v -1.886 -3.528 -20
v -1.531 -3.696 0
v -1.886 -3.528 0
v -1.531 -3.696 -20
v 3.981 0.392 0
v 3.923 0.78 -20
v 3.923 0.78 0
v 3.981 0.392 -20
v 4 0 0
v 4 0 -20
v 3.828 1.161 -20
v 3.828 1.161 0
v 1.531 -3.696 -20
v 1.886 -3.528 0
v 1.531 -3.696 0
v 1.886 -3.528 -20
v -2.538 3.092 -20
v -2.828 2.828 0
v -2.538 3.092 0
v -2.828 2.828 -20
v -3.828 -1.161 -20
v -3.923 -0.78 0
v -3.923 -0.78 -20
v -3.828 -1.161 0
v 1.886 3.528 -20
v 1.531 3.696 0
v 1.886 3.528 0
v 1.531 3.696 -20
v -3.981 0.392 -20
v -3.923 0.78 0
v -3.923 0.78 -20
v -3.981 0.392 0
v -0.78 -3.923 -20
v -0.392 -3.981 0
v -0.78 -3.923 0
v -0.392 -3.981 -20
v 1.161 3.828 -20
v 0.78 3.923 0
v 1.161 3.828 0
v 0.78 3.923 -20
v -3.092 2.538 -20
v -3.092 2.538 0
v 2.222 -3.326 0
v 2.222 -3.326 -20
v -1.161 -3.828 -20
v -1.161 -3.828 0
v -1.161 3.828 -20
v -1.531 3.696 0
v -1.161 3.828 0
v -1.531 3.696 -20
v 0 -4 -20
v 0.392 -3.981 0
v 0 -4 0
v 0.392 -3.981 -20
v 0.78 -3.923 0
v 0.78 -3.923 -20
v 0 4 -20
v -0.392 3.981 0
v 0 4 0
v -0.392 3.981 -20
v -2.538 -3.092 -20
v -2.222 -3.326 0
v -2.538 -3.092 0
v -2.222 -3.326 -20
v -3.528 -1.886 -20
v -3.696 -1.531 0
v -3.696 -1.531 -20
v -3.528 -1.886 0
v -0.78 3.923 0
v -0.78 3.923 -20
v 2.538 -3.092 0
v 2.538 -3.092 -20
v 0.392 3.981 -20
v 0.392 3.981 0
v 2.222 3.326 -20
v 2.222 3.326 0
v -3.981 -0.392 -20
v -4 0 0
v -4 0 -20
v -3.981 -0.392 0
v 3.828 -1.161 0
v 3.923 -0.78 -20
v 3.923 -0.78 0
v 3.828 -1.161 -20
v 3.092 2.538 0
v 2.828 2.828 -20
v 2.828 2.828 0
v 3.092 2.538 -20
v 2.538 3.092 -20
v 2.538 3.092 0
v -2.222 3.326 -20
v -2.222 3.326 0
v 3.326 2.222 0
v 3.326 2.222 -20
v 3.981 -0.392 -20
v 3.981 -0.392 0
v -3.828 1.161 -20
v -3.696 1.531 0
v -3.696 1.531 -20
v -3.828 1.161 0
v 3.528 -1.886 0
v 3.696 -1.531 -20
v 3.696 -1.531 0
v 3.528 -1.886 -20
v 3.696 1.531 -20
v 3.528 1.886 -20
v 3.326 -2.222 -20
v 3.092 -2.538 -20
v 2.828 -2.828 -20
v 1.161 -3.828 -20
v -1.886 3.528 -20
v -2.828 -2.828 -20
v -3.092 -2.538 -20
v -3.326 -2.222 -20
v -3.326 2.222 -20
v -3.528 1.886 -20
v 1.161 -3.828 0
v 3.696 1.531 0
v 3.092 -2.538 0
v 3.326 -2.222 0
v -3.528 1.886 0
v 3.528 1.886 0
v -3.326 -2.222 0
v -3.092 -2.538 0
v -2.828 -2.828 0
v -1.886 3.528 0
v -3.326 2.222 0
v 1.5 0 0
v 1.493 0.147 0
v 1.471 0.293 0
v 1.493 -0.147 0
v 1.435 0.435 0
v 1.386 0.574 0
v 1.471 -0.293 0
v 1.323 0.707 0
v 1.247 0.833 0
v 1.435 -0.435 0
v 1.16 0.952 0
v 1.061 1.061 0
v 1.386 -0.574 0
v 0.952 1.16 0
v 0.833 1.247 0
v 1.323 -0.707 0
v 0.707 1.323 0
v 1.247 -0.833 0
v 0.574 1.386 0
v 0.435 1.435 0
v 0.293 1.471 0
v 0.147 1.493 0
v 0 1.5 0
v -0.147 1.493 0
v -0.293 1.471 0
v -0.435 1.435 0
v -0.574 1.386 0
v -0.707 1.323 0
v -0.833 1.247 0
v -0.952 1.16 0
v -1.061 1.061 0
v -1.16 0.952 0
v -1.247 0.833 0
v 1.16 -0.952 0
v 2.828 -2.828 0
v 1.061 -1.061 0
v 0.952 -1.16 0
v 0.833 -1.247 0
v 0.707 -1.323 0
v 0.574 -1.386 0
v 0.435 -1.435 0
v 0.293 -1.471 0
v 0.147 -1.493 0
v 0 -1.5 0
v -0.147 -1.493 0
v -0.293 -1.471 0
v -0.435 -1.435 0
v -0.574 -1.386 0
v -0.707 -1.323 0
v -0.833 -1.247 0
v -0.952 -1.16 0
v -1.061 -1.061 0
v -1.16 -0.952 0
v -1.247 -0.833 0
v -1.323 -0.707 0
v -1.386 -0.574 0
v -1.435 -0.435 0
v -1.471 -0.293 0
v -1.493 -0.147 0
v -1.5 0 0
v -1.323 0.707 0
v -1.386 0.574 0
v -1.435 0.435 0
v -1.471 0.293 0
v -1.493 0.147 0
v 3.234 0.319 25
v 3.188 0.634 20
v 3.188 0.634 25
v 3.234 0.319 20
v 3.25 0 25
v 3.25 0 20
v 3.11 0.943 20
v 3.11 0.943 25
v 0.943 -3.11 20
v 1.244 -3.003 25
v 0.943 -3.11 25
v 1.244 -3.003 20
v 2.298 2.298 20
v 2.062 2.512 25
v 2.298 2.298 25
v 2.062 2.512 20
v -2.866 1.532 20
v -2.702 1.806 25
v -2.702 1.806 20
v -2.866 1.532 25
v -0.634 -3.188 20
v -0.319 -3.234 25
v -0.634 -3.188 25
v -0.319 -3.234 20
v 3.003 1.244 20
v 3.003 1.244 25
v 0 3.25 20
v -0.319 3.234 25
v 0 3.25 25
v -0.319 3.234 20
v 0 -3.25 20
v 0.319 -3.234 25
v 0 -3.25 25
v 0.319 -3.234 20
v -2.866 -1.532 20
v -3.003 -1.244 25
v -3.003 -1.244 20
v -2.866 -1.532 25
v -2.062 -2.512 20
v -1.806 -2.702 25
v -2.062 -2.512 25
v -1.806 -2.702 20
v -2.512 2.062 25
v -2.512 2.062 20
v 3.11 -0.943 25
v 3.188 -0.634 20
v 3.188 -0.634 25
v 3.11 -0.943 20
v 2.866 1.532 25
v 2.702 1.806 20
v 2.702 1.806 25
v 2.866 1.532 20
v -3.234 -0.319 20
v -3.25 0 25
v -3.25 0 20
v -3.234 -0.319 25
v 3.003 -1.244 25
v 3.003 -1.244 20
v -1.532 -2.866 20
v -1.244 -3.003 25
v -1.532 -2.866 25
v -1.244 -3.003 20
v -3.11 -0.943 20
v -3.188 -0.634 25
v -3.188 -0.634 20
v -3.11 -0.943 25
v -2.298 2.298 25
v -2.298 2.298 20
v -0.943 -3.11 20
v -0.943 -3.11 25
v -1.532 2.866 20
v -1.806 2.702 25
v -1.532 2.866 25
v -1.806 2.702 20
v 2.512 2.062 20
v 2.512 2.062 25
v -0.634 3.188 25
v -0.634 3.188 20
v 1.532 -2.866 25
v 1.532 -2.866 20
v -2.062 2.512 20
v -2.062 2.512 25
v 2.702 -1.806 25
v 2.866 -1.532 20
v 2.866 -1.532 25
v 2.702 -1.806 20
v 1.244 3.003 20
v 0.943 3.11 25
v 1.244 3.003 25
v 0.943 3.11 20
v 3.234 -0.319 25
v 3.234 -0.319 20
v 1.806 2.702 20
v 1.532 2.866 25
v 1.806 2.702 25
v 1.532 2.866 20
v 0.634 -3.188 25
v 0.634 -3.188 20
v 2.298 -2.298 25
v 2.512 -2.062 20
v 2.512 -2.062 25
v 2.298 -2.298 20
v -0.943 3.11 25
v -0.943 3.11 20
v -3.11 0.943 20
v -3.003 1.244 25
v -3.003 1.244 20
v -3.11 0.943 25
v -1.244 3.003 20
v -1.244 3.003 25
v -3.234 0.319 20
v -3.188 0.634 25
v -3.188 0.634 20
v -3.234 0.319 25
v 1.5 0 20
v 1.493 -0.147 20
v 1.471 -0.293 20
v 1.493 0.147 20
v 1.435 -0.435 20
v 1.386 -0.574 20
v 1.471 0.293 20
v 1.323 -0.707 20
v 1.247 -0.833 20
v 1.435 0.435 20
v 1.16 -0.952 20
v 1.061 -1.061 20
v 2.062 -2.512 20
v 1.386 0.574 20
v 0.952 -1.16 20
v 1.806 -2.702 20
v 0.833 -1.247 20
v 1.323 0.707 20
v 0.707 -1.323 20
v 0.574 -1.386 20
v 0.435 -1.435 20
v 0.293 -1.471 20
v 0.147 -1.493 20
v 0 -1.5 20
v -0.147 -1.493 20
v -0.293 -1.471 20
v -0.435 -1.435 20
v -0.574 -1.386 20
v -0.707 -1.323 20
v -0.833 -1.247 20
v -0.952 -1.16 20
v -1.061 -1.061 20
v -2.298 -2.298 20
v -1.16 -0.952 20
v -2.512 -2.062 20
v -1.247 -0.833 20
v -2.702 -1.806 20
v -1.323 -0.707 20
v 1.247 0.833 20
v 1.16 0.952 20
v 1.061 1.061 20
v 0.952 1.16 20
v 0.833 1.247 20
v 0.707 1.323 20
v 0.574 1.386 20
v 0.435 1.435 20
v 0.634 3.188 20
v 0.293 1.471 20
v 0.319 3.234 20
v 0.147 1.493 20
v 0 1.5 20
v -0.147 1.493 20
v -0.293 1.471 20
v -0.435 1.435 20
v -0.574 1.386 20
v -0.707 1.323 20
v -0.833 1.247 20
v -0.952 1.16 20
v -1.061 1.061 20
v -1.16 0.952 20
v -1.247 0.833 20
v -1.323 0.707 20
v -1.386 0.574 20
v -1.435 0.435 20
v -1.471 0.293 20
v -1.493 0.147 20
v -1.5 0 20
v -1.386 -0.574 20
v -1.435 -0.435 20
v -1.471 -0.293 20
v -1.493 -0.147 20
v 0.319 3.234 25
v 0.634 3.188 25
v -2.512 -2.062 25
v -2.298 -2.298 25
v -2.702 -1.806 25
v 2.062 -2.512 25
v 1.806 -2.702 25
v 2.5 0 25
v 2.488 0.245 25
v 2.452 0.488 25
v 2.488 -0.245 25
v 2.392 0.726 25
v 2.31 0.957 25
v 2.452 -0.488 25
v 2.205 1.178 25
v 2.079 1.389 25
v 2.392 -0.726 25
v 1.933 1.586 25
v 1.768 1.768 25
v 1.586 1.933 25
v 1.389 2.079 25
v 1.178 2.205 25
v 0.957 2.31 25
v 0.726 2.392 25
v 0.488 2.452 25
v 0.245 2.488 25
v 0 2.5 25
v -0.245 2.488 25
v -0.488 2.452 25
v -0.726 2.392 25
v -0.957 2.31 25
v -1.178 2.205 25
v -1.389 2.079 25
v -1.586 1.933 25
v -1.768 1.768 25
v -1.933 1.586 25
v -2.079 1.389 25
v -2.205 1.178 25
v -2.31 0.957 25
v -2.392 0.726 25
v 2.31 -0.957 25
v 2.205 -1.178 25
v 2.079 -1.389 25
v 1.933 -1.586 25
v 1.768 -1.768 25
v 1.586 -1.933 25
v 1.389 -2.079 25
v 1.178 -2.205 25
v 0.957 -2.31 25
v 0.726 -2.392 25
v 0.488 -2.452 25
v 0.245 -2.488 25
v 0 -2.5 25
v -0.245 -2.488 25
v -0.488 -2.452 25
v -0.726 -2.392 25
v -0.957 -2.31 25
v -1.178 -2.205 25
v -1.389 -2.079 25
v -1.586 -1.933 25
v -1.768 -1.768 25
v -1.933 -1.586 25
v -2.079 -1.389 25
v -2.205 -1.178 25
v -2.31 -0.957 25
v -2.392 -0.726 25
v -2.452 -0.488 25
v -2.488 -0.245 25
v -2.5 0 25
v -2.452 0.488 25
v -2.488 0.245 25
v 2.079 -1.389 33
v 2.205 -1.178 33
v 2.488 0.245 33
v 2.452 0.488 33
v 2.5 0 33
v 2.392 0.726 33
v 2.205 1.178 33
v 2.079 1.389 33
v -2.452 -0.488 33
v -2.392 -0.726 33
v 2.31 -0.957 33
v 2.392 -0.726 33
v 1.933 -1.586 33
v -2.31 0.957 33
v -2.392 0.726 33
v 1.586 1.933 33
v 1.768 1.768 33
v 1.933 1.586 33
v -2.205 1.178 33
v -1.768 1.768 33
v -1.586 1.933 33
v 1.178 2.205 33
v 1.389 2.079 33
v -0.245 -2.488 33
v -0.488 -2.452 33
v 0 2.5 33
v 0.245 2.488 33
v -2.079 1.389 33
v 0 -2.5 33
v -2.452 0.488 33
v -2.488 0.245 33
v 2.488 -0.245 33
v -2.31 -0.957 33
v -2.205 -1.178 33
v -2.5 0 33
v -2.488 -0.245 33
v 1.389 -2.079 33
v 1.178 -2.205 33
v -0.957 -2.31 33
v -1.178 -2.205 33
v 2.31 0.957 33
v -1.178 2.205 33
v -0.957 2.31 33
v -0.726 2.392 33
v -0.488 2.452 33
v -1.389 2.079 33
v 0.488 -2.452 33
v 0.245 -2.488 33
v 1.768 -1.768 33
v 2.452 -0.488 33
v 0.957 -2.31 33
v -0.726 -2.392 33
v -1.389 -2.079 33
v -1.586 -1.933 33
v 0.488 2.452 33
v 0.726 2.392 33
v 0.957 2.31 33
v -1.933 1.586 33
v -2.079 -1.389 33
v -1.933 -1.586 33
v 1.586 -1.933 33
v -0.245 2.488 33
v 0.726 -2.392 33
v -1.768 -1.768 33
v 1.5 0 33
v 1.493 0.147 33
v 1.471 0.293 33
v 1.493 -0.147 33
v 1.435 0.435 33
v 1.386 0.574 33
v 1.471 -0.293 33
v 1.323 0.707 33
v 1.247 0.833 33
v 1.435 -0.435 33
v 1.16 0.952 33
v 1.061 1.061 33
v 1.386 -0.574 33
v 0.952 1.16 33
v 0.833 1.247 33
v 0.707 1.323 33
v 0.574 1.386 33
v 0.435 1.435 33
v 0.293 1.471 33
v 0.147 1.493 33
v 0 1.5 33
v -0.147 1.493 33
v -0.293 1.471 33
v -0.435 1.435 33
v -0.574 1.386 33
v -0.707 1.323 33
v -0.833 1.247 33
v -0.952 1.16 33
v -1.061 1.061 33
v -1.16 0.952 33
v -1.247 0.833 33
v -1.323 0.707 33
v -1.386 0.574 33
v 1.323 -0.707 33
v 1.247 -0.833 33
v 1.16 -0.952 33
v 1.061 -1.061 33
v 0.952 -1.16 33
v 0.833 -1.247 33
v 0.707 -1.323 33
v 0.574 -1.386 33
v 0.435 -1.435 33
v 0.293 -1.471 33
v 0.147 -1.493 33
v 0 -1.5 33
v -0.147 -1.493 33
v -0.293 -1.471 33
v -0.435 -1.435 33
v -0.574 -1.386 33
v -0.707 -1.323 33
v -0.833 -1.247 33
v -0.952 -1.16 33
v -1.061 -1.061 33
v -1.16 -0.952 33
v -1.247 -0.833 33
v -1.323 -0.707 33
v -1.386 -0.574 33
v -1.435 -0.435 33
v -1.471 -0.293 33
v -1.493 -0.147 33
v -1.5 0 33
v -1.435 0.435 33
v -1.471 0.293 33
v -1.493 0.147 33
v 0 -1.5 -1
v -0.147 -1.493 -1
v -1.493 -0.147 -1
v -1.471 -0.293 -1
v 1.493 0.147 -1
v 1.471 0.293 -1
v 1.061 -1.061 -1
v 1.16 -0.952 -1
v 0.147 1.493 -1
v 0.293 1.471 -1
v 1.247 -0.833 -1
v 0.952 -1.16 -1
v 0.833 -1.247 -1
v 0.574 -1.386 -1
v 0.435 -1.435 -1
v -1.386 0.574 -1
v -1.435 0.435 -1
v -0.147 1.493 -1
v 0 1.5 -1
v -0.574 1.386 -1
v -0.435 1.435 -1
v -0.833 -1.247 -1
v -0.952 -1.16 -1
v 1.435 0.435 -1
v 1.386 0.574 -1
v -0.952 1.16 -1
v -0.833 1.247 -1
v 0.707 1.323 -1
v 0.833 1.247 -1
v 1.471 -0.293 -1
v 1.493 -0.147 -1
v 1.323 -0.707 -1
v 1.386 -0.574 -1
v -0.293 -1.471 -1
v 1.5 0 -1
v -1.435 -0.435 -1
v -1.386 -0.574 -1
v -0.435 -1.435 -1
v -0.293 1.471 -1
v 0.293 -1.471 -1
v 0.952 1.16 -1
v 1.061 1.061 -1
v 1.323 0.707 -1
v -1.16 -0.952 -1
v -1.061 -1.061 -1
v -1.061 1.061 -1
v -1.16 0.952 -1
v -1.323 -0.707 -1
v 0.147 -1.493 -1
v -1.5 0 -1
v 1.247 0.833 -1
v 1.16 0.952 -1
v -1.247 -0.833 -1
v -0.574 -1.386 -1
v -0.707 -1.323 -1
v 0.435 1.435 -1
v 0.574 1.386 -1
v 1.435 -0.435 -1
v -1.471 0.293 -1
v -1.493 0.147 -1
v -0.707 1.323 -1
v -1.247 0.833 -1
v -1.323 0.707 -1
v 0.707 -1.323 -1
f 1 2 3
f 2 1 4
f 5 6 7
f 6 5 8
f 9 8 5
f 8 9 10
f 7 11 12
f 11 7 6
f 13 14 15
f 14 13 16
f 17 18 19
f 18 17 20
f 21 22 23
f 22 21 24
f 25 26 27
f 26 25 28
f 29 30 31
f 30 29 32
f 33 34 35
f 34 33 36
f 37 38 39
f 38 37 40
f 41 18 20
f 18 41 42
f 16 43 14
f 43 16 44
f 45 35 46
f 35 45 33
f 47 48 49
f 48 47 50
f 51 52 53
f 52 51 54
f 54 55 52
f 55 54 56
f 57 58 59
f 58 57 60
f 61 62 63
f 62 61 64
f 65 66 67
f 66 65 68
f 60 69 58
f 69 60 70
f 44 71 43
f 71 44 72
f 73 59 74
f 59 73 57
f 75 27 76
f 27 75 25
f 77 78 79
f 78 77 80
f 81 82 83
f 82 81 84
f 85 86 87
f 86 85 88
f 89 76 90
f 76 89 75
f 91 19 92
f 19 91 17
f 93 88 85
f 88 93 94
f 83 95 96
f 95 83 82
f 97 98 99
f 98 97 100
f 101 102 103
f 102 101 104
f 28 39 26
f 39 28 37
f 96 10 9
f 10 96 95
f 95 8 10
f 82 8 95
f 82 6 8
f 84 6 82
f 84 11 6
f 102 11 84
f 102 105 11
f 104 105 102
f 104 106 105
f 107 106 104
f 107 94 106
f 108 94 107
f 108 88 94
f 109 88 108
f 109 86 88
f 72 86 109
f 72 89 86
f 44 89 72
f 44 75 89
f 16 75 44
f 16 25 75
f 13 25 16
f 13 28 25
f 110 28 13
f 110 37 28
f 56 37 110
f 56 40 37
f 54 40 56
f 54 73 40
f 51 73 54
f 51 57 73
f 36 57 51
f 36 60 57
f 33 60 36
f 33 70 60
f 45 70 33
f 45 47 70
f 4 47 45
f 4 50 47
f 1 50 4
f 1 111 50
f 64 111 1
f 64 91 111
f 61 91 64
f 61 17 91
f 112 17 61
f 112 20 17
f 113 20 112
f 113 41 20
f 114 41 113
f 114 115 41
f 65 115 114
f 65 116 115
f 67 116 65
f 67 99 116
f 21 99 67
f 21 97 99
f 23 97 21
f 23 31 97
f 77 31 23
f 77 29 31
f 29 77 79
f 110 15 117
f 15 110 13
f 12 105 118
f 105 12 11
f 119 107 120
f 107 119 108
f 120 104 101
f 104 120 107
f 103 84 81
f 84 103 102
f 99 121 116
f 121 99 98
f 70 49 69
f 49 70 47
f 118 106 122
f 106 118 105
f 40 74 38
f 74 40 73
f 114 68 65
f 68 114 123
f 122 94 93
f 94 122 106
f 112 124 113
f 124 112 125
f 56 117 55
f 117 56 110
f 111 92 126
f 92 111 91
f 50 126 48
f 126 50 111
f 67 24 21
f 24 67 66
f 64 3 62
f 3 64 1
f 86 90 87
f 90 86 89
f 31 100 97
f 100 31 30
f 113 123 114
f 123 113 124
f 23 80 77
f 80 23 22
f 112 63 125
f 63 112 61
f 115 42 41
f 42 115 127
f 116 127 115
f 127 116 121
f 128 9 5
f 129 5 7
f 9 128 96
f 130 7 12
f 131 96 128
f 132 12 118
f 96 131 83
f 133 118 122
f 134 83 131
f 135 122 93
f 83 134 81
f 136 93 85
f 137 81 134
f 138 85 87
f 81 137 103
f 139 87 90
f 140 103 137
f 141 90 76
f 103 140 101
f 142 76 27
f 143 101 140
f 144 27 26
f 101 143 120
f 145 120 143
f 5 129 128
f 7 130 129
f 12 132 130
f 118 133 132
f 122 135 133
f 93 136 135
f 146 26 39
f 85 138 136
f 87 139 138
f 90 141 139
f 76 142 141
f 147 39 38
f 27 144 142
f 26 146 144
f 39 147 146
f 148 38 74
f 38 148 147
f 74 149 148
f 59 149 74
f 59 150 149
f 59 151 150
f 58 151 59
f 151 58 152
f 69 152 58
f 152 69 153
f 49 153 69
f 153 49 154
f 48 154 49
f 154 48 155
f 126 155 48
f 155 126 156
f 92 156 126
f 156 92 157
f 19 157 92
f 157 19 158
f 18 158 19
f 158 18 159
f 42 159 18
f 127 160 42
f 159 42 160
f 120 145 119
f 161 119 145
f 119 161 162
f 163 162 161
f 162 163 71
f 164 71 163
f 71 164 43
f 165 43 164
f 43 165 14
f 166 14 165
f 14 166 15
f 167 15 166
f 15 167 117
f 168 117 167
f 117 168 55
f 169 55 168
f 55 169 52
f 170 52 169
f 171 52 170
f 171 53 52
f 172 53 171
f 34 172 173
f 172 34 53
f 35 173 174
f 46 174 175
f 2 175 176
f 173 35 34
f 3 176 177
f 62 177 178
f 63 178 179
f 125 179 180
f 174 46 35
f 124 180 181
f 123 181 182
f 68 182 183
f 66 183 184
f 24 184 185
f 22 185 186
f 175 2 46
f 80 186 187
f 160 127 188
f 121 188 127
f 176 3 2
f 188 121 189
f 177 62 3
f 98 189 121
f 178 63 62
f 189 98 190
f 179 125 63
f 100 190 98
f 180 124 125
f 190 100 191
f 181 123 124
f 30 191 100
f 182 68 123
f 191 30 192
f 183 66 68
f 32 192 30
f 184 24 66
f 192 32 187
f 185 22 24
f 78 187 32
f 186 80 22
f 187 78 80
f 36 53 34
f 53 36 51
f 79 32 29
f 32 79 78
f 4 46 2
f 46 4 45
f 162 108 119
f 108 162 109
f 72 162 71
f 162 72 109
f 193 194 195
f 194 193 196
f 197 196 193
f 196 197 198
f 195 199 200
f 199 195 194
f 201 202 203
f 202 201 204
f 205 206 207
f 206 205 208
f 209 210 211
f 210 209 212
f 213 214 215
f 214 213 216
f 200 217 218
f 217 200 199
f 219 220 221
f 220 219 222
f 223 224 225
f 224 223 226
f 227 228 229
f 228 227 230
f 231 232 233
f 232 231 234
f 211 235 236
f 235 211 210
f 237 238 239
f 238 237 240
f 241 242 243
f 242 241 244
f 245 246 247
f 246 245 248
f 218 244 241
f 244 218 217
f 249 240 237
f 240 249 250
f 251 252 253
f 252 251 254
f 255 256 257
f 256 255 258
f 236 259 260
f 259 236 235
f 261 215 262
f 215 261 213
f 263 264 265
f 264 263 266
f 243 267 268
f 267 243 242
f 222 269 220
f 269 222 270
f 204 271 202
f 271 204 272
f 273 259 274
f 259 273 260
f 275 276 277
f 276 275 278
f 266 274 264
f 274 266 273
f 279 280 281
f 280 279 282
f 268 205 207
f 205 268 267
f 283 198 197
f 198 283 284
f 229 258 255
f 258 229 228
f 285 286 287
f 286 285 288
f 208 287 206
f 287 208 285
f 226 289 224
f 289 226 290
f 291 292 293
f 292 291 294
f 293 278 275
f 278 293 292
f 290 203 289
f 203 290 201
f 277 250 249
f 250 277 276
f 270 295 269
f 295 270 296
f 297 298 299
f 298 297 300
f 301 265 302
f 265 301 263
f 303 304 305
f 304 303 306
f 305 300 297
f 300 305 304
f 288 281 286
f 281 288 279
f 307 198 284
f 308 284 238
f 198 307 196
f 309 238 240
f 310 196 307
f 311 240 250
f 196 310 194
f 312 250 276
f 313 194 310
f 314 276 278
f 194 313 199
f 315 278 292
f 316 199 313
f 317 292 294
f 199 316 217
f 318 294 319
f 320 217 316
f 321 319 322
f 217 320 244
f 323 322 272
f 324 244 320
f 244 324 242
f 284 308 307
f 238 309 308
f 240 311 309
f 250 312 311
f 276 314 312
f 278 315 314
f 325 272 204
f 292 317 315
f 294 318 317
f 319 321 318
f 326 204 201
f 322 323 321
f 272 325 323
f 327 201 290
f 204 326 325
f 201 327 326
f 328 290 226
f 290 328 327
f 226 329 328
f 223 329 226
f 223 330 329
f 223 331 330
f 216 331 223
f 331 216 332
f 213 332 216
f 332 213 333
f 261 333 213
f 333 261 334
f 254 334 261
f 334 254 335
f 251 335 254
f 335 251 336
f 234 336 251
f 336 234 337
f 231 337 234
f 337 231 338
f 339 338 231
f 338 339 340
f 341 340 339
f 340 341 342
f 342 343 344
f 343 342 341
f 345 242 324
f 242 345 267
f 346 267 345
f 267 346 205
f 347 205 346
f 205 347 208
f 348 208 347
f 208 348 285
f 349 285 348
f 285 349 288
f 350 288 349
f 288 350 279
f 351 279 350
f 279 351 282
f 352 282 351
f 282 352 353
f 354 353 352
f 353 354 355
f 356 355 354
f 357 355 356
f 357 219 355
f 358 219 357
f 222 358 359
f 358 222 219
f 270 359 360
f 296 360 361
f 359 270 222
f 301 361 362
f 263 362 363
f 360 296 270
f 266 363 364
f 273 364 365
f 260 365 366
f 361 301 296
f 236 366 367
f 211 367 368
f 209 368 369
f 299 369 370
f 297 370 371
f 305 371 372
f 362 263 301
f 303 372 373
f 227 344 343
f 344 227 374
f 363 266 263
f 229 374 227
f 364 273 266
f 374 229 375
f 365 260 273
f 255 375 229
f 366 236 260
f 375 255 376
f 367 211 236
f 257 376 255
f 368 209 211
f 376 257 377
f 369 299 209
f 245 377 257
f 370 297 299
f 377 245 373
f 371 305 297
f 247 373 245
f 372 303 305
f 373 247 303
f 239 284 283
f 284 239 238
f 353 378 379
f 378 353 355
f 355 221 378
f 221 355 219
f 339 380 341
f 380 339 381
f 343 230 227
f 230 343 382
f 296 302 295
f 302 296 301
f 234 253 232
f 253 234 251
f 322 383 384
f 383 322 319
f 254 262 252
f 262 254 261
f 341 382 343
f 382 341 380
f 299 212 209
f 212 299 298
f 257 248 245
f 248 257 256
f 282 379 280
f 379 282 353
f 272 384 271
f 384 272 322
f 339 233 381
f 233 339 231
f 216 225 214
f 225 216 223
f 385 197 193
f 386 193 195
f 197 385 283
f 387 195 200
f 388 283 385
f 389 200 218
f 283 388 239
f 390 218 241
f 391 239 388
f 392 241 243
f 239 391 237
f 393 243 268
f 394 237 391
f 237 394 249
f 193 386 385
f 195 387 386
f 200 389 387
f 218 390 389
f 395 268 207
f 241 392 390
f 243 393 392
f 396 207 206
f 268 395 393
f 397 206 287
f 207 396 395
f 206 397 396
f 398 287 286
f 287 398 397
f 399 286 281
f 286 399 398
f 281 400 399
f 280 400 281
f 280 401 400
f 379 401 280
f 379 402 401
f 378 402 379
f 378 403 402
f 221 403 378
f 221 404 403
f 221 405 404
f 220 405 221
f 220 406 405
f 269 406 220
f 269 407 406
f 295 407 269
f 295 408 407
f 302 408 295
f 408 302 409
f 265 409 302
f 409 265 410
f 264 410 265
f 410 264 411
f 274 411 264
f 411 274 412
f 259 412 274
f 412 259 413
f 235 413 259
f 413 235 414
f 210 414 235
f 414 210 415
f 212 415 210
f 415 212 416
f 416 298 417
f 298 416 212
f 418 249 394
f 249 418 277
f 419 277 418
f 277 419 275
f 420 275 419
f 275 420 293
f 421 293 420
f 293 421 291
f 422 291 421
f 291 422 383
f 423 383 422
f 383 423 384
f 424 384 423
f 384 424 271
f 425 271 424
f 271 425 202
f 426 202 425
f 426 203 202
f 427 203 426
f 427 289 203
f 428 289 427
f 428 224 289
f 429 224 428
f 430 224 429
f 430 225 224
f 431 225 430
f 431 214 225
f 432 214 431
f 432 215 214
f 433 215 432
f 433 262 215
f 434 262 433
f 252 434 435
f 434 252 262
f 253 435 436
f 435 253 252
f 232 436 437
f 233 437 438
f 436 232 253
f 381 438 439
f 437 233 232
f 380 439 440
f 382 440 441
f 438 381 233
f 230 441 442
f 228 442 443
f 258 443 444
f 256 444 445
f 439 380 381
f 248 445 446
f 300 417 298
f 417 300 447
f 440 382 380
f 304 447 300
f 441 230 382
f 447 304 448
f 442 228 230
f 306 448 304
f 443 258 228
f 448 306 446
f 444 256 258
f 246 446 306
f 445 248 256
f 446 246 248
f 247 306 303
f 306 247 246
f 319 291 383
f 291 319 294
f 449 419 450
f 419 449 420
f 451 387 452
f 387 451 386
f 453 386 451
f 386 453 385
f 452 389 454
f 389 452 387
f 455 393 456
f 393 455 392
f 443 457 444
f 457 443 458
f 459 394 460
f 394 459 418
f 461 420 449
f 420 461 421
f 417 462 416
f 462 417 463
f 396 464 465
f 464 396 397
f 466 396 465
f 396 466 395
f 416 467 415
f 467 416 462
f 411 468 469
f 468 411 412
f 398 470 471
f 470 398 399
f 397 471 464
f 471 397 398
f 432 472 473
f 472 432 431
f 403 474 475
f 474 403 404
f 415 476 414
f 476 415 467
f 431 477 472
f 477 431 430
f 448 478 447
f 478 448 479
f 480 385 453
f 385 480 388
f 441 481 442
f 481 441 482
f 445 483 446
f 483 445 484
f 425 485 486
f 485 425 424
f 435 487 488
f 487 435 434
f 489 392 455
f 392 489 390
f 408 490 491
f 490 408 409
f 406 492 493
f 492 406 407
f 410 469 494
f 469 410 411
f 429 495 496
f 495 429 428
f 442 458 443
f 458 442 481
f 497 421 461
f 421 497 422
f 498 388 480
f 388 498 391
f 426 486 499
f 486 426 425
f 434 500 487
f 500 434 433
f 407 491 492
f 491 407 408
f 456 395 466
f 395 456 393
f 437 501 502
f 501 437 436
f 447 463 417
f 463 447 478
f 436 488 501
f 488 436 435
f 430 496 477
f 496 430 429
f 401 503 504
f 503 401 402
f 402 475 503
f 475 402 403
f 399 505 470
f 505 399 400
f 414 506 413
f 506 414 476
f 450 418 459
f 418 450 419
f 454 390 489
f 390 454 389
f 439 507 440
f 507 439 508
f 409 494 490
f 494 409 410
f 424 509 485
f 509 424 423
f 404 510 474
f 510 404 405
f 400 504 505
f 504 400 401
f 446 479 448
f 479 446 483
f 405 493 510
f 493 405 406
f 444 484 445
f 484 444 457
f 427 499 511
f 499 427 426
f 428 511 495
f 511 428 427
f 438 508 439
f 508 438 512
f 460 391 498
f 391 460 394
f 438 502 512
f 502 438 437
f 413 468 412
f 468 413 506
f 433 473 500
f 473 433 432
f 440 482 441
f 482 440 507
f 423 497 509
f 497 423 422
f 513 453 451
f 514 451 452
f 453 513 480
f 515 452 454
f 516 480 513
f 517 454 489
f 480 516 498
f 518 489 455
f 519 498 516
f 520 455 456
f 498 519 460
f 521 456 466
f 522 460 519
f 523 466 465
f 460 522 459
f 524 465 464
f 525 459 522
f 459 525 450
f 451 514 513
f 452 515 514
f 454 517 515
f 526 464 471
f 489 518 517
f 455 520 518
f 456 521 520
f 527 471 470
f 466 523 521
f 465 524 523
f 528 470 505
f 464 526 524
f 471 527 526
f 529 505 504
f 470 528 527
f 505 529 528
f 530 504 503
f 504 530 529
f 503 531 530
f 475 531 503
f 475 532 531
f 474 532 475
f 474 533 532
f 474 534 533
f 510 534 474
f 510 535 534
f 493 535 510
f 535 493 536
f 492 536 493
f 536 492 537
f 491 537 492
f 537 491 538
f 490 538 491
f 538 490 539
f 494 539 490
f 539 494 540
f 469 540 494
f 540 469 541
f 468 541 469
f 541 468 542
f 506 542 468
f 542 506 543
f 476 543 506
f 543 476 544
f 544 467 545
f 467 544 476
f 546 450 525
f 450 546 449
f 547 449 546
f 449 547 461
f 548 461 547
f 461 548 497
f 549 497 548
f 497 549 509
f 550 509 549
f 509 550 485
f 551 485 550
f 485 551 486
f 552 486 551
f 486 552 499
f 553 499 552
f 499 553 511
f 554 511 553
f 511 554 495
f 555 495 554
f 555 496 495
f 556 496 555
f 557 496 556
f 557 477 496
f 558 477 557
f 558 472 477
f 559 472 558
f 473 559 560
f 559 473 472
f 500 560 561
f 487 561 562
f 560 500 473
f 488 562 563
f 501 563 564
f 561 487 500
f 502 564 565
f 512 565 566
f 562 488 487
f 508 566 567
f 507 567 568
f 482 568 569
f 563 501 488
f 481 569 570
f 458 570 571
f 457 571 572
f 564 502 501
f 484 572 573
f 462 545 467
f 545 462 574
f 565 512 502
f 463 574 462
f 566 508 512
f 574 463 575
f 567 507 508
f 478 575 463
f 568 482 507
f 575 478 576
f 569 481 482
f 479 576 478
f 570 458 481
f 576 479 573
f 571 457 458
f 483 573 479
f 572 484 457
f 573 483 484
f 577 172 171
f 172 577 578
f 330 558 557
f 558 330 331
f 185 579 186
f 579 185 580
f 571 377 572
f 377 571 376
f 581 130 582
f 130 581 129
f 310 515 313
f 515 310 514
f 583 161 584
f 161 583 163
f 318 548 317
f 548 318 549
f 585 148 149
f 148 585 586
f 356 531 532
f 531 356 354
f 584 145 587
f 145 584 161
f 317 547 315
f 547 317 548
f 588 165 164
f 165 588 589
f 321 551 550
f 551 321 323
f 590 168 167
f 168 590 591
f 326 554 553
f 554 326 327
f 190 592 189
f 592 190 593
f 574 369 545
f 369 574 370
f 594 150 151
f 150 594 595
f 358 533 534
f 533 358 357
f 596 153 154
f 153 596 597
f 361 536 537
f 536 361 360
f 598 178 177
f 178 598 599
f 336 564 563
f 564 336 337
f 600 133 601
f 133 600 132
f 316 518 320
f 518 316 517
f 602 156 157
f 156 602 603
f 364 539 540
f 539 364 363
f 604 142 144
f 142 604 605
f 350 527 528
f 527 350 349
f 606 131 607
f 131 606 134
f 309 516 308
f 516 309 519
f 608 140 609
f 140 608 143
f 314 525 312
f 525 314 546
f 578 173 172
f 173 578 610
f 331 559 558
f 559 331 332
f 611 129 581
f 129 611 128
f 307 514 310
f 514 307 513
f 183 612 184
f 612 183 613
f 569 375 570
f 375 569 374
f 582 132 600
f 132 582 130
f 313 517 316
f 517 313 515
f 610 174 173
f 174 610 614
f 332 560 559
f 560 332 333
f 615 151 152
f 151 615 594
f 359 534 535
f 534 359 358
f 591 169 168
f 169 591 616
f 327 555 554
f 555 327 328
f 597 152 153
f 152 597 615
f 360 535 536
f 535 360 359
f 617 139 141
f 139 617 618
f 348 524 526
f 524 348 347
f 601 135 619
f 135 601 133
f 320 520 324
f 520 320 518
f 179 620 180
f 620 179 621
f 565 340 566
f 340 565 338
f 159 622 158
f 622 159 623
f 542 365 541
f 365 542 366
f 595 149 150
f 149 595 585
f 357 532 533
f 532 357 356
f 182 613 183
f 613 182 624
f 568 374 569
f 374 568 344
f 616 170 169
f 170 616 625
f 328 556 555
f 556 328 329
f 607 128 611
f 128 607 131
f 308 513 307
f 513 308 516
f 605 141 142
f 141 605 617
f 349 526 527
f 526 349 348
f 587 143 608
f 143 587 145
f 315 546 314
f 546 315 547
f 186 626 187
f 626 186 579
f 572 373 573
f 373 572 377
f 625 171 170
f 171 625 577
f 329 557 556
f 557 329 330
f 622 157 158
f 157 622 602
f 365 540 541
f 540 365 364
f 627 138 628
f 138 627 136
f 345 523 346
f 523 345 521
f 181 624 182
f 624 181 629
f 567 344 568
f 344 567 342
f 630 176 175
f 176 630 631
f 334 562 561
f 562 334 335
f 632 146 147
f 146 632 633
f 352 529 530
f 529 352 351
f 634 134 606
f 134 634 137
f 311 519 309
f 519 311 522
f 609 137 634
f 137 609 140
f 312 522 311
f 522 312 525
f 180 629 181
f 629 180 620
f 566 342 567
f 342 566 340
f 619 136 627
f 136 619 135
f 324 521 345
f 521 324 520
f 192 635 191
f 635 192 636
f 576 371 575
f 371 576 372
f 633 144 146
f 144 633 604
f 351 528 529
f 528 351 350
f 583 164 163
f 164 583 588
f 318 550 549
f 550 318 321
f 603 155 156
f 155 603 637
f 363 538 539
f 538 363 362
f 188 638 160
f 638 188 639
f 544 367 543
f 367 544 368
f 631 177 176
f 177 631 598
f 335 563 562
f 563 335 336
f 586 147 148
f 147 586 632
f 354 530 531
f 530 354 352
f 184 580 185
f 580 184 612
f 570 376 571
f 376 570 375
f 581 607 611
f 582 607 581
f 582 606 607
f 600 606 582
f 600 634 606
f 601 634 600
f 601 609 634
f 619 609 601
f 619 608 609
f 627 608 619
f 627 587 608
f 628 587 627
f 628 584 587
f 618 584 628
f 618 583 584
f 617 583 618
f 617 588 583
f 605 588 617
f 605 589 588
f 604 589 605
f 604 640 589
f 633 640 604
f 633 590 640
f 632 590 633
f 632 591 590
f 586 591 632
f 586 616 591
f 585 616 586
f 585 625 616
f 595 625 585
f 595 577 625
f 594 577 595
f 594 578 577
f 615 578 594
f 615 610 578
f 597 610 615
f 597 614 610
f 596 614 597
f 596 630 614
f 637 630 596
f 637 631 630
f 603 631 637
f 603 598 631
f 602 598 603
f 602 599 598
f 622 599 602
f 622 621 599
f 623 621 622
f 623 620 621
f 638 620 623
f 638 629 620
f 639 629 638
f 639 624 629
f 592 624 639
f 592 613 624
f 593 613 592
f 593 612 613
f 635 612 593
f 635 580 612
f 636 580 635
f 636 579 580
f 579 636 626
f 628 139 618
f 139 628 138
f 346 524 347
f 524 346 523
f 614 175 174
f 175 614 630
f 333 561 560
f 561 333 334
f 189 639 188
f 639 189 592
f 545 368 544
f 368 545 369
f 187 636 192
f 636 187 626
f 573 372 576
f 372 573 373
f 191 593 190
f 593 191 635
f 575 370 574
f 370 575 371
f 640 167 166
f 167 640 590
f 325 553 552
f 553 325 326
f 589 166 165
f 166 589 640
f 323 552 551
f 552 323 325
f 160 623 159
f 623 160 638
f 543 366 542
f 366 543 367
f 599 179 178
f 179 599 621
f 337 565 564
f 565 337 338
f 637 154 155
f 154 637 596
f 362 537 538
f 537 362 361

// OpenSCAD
// Hose-barb reducer: 8 mm OD barb -> 5 mm OD barb
// Print orientation: standing upright along Z

$fn = 64;

// ---- Dimensions (mm) ----
t1      = 8;    // outer diameter of 8 mm tubing
t2      = 5;    // outer diameter of 5 mm tubing
bore    = 3;    // through-bore diameter
flange  = 1.5;  // flare at end of a barb

lz      = 20;   // length of 8 mm barb section
collar  = 5;    // length of collar section
rz      = 8;    // length of 5 mm barb section

// ---- Derived ----
inner_r = bore / 2;
flange_r = t1 / 2 + flange;
collar_d = t2 + flange;

// ---- Model ----
difference() {
    union() {
        // 8 mm barb
        rotate_extrude() translate([0, 0, lz])
            circle(r = flange_r);
        translate([0, 0, -lz])
            cylinder(h = lz, r = t1 / 2);

        // collar
        translate([0, 0, lz])
            cylinder(h = collar, d = collar_d);

        // 5 mm barb
        translate([0, 0, lz + collar])
            cylinder(h = rz, r = t2 / 2);
    }
    // through bore
    translate([0, 0, -1])
        cylinder(h = lz + collar + rz + 2, r = inner_r);
}
